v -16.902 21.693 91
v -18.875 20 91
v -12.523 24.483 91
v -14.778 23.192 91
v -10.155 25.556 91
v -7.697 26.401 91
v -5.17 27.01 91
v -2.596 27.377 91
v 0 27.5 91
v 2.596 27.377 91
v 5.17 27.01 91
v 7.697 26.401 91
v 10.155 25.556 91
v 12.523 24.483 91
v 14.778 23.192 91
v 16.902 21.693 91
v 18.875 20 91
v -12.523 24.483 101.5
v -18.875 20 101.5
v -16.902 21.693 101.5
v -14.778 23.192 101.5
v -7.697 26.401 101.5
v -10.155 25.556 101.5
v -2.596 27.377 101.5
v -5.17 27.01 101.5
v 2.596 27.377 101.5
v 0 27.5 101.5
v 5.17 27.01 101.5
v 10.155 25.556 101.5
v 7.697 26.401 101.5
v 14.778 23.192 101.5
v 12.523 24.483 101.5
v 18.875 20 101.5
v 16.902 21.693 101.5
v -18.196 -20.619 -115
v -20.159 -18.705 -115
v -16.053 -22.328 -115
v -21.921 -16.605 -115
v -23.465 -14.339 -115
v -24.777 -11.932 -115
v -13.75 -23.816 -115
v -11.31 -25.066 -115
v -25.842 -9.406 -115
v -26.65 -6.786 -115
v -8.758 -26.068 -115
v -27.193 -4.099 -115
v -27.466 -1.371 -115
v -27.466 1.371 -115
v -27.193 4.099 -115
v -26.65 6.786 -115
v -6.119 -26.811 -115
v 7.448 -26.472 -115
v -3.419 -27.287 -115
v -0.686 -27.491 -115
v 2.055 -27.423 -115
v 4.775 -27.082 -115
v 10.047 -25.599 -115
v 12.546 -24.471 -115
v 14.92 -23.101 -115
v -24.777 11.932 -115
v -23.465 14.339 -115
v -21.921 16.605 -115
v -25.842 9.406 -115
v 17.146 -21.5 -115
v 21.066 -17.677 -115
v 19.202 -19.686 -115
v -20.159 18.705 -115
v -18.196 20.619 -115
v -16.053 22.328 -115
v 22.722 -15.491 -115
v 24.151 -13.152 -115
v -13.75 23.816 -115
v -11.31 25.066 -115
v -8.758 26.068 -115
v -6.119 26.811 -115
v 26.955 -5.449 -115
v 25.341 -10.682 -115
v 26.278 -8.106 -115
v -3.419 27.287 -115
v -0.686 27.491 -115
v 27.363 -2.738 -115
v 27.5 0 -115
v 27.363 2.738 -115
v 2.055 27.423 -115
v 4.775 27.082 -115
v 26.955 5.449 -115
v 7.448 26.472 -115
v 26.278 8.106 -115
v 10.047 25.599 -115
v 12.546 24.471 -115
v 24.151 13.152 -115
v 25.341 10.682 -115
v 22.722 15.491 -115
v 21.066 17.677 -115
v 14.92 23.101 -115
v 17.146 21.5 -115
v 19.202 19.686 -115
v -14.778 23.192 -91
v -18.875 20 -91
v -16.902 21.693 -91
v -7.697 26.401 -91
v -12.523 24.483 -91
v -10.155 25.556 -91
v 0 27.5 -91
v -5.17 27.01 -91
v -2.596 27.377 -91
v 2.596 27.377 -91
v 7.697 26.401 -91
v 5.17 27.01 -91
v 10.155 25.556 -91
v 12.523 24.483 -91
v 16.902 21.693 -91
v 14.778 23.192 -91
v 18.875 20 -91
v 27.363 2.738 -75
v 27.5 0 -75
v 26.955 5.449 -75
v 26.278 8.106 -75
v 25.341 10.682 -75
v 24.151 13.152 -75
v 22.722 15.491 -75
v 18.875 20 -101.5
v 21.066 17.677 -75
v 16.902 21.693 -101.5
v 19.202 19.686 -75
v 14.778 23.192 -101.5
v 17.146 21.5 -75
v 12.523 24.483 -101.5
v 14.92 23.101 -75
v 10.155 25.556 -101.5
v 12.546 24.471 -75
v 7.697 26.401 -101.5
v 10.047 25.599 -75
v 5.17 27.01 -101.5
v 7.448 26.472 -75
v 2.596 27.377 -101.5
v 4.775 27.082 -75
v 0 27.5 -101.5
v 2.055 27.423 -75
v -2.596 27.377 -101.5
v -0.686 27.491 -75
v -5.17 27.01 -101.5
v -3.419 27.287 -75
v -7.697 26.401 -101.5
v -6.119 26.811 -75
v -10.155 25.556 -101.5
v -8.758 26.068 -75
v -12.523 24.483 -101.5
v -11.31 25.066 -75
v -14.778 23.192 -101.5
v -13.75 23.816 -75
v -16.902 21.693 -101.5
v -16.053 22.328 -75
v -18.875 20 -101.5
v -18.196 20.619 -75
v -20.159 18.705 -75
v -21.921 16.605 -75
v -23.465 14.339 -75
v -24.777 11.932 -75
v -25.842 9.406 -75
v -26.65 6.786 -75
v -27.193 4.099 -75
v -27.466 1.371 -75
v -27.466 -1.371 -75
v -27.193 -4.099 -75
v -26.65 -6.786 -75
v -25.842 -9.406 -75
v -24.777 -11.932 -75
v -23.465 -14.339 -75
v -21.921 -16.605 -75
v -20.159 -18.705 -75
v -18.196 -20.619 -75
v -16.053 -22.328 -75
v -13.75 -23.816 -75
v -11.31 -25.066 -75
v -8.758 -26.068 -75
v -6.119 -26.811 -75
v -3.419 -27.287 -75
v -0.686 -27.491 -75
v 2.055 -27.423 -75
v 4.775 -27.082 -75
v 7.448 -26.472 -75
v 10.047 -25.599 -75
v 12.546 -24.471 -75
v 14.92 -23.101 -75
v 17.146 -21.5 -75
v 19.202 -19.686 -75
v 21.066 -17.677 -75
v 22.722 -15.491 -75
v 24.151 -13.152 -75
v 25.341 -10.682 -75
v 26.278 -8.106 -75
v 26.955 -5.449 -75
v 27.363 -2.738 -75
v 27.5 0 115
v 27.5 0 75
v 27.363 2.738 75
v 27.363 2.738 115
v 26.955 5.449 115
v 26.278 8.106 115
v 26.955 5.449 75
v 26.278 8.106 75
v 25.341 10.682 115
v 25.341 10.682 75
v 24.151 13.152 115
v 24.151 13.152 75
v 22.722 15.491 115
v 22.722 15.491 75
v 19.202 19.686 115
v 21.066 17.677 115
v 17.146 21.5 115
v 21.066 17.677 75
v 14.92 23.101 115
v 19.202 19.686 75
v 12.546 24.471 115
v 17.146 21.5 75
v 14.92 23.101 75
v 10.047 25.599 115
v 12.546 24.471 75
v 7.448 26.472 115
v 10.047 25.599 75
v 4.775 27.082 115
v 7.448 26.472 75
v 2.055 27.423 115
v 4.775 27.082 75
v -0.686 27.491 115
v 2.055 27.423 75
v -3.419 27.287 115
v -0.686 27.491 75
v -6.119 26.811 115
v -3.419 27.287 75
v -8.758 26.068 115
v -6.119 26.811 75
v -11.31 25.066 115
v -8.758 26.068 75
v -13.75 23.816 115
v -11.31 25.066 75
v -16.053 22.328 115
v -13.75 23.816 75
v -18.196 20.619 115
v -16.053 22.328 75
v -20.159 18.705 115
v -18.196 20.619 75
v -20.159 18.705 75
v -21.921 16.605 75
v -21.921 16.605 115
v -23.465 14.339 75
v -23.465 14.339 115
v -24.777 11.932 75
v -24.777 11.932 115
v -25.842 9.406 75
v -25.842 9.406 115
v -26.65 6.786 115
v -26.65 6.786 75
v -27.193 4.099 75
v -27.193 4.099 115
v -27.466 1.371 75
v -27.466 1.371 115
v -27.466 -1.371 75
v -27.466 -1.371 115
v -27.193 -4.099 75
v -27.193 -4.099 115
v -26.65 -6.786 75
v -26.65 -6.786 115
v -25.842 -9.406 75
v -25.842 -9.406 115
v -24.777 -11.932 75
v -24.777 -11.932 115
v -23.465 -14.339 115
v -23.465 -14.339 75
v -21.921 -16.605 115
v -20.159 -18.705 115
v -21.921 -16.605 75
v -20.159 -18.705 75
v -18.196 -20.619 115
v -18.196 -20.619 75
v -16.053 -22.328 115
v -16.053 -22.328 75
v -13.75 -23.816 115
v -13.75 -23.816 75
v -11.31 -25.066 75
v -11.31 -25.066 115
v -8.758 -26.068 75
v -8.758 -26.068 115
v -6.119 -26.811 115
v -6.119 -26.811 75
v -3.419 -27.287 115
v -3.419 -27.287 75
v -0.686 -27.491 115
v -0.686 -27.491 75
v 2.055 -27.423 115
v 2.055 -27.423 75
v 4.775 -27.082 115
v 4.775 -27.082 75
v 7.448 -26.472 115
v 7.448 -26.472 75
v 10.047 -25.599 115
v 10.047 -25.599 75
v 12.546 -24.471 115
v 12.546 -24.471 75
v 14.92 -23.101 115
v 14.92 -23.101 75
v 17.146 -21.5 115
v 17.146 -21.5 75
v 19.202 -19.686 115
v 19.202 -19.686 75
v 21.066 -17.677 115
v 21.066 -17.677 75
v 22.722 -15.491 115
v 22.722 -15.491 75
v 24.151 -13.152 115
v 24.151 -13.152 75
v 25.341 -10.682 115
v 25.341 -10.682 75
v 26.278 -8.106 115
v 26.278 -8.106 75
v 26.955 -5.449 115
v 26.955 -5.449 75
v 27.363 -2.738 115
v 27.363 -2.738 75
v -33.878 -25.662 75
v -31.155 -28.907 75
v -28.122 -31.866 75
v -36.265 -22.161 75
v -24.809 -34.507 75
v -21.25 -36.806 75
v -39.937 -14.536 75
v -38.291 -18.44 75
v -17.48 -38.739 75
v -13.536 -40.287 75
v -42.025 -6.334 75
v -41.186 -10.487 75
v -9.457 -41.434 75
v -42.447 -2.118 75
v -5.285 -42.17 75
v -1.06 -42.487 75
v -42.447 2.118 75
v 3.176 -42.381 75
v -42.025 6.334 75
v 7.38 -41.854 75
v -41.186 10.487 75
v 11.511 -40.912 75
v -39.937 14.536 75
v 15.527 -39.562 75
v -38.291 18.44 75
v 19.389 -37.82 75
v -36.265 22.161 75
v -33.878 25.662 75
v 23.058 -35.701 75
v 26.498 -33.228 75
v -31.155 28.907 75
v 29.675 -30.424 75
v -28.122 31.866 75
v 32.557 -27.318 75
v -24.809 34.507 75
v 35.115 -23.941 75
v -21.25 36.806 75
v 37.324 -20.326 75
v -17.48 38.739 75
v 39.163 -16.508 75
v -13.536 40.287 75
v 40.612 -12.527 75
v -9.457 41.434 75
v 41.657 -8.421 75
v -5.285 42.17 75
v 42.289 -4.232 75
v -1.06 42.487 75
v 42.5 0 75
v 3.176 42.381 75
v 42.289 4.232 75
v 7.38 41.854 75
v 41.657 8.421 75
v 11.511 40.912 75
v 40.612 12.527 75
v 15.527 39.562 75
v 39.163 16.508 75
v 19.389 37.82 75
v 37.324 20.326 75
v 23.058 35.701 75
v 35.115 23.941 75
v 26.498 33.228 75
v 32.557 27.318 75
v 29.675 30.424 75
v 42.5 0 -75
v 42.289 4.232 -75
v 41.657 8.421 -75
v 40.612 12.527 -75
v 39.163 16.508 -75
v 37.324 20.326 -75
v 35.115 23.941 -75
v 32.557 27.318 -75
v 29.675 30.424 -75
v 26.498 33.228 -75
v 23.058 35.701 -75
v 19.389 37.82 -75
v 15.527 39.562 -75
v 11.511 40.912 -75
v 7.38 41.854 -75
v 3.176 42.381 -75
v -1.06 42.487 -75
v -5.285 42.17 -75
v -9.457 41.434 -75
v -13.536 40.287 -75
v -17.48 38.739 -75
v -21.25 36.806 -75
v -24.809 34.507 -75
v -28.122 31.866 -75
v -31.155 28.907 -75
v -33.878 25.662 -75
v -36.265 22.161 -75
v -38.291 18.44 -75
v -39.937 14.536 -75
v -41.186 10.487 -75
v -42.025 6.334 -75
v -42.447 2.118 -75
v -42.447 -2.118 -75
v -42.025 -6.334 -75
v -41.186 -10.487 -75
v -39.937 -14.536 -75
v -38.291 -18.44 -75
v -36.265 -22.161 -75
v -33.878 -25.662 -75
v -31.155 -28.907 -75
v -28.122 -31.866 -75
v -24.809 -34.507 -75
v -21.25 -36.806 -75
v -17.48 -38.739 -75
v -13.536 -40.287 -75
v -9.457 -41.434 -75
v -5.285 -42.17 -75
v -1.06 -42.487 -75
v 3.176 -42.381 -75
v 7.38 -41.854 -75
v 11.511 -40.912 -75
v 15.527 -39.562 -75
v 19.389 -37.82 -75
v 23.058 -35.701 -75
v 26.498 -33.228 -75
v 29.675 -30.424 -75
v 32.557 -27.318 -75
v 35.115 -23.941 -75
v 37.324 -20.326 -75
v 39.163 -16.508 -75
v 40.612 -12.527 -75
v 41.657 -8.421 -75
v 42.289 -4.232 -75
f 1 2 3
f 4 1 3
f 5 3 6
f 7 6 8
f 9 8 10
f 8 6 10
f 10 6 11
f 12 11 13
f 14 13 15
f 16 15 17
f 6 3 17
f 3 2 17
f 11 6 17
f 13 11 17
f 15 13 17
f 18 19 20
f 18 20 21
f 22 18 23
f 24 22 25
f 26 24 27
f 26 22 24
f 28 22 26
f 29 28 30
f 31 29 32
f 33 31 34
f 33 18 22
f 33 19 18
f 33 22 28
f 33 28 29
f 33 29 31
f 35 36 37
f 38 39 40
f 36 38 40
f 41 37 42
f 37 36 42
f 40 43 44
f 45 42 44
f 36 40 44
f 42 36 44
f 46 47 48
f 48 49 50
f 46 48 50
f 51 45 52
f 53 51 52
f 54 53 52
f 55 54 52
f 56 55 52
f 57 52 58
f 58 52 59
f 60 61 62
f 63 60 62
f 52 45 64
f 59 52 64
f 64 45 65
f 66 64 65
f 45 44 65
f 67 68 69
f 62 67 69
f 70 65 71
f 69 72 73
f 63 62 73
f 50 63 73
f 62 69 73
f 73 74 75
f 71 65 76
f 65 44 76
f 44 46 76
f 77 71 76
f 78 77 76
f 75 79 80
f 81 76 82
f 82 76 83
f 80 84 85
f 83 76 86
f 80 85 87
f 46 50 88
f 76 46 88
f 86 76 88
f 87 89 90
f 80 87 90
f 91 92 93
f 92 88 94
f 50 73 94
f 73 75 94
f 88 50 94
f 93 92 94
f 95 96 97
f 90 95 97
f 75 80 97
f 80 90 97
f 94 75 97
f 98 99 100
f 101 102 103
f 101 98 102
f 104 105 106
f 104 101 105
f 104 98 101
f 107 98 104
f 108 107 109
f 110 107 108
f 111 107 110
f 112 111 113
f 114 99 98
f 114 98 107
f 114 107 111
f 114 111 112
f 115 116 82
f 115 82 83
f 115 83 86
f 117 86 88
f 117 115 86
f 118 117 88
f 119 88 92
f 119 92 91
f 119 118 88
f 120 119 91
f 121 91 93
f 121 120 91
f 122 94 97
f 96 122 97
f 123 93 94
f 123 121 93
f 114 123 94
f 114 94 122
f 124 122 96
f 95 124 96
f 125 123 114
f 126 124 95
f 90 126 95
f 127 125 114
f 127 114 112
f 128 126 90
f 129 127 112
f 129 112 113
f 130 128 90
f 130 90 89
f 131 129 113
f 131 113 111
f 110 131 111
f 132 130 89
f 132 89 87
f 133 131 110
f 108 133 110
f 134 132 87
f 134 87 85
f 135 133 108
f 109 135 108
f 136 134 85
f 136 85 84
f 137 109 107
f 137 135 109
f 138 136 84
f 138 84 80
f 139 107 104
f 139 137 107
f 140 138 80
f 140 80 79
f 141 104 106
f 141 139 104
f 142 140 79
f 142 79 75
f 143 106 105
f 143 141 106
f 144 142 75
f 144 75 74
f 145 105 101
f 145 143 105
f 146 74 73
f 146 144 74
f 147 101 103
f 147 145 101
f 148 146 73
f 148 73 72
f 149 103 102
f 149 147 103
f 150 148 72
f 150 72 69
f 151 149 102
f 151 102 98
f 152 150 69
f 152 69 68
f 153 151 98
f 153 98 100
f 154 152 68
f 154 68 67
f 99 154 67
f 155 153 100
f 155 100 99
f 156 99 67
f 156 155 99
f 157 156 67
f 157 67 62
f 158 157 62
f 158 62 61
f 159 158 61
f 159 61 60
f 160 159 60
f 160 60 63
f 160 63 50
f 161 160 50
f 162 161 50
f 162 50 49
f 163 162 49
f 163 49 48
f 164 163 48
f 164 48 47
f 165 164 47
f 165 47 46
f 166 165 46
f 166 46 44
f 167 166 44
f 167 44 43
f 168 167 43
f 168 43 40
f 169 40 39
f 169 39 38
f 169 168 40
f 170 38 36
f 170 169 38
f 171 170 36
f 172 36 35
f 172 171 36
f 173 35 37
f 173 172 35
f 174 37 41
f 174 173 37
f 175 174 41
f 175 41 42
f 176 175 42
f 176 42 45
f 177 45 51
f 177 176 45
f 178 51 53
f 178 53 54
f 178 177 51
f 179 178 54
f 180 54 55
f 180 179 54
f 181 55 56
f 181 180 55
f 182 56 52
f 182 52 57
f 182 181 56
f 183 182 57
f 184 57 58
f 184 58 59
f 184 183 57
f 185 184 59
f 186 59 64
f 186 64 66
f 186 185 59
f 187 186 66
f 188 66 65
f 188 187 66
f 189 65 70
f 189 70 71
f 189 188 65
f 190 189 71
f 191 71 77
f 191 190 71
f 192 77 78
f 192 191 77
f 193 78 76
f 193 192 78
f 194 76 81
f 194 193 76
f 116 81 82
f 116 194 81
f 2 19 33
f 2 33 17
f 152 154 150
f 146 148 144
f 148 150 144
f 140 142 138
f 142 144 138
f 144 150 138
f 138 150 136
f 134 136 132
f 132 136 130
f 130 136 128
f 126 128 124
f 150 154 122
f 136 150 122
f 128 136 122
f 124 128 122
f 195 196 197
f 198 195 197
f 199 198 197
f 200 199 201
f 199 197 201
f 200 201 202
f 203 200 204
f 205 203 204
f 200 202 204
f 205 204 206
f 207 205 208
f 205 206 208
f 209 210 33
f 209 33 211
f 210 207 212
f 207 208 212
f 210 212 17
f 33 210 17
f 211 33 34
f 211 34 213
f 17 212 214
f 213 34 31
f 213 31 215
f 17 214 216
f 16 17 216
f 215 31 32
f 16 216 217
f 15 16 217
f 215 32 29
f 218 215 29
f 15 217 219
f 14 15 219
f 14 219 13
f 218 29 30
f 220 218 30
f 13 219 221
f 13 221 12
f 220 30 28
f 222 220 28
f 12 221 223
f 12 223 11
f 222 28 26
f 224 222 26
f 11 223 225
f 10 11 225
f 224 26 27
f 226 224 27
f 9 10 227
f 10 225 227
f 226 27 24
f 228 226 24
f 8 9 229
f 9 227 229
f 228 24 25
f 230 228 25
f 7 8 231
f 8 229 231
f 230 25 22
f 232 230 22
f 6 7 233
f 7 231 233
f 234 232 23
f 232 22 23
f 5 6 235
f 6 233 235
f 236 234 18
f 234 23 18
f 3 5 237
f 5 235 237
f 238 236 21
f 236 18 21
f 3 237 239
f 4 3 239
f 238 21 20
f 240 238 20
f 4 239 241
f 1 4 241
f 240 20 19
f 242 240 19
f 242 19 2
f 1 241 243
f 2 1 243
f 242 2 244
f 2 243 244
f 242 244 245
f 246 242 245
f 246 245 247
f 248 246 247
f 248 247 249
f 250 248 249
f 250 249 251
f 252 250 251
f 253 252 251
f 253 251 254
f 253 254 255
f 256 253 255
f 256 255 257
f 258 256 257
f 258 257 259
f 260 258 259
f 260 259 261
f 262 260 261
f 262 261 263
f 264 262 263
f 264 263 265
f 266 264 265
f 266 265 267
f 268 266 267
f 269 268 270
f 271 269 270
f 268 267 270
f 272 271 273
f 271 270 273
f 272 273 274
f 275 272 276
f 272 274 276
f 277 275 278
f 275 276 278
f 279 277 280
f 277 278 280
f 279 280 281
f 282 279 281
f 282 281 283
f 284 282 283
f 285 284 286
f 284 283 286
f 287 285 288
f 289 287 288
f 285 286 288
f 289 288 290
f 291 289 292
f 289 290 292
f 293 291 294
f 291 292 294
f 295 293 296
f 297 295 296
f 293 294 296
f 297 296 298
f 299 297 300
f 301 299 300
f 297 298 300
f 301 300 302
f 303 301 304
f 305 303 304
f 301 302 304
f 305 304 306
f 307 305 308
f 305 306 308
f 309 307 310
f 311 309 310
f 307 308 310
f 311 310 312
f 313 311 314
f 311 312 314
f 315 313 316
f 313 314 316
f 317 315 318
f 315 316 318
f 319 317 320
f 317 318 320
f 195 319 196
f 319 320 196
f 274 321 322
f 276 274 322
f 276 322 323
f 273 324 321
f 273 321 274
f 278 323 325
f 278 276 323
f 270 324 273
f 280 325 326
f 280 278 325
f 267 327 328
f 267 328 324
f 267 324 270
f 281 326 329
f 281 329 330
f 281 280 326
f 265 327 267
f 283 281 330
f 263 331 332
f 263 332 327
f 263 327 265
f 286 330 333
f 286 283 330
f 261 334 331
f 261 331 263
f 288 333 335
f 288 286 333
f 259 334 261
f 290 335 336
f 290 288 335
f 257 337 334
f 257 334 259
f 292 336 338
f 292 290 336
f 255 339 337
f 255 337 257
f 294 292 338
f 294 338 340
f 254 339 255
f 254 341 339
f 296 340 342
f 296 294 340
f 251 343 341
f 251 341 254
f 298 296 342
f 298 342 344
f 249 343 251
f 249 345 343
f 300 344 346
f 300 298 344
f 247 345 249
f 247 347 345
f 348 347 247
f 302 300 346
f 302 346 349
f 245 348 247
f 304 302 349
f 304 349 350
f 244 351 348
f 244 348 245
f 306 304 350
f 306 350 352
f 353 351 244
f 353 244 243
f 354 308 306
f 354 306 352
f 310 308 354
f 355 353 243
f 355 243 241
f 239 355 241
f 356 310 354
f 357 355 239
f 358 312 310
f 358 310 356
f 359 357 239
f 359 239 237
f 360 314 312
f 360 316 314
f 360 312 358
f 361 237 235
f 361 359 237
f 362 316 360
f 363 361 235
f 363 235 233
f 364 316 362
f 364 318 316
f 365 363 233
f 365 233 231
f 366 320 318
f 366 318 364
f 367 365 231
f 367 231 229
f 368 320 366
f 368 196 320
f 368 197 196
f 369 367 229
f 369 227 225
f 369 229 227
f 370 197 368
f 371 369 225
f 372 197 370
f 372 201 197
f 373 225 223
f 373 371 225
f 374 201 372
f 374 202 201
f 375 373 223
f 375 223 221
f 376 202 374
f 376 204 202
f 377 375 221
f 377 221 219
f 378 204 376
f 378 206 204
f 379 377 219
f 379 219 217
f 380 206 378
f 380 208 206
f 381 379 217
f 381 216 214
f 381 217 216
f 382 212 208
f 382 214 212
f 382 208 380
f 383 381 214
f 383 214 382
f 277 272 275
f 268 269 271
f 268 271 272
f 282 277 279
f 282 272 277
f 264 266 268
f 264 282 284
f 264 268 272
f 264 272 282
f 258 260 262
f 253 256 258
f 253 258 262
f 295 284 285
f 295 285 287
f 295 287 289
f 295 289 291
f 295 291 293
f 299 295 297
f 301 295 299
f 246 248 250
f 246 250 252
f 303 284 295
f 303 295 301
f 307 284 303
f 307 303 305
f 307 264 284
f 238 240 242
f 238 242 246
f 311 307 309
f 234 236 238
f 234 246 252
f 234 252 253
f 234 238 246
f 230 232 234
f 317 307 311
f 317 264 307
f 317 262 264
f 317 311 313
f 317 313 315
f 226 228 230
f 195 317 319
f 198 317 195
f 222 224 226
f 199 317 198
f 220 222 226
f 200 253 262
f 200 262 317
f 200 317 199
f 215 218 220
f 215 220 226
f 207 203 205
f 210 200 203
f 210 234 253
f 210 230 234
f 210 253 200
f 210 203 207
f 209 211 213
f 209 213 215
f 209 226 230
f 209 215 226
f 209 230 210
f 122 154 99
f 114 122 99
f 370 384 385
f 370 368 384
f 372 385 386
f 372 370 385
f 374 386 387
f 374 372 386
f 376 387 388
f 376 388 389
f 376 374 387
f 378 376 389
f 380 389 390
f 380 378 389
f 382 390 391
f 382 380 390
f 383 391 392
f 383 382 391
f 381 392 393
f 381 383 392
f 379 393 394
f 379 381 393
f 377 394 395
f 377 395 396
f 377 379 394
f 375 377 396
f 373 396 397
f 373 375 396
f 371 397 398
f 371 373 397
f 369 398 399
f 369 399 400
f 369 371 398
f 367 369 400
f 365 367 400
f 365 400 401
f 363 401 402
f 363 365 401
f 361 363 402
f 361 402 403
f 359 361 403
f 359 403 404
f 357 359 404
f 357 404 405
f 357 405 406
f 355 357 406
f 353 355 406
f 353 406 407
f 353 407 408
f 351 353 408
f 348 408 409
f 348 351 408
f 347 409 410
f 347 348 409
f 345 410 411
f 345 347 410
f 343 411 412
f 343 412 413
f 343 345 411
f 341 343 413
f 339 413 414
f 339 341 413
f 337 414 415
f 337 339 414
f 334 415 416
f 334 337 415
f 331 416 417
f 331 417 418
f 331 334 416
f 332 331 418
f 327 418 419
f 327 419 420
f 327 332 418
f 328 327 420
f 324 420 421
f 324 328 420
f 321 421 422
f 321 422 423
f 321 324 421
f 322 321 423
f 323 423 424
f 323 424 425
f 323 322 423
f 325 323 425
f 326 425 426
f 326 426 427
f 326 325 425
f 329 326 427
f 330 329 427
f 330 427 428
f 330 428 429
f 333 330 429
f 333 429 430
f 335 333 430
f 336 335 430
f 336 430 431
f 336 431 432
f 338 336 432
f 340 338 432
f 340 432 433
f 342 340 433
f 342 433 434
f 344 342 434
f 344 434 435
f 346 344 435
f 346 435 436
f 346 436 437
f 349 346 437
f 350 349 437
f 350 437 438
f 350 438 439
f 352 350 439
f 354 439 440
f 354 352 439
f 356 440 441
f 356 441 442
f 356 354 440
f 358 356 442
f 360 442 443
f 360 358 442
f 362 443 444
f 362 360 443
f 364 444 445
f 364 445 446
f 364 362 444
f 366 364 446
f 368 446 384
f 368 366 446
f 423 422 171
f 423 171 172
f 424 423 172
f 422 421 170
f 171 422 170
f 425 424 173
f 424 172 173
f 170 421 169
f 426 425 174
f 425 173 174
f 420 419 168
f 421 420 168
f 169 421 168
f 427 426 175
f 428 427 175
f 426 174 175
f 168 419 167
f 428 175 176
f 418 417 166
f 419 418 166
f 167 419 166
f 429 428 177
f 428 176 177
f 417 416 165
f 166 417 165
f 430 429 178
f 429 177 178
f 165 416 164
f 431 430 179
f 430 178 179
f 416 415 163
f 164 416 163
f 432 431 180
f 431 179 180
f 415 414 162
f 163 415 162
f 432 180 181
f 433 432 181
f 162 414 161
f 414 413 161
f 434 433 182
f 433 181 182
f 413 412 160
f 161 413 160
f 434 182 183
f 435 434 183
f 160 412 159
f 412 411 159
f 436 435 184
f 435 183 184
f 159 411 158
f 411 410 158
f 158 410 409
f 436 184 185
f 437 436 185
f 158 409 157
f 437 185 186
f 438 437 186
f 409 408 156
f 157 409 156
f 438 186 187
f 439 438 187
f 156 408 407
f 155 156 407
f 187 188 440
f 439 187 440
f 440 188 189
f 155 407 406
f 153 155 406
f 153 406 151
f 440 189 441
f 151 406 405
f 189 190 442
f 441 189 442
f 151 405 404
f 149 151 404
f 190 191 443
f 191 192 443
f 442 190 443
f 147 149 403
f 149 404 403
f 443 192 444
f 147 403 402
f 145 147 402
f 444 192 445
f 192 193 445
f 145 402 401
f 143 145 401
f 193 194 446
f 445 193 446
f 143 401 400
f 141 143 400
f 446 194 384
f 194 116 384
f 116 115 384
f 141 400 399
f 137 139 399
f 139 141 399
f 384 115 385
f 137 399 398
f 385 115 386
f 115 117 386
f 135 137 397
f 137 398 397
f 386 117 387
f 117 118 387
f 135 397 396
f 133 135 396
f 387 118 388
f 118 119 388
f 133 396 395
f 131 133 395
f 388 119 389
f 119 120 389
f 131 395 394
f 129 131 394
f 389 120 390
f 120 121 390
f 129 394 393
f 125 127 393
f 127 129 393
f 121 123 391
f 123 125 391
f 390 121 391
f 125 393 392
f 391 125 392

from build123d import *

# Parameters (mm, degrees)
SKETCH2_R           = 42.5
BOSS_EXTRUDE2_DEPTH = 75
SKETCH3_R           = 27.5
BOSS_EXTRUDE3_DEPTH = 40
SKETCH4_W           = 10.5
SKETCH4_H           = 8.79879656
CUT_EXTRUDE1_DEPTH  = 50


with BuildPart() as part:
    # Sketch2 → Boss-Extrude2 (new, symmetric)
    with BuildSketch(Plane.XY):
        Circle(SKETCH2_R)
    extrude(amount=BOSS_EXTRUDE2_DEPTH, both=True)

    # Sketch3 → Boss-Extrude3 (add)
    with BuildSketch(Plane.XY.offset(75)):
        Circle(SKETCH3_R)
    boss_extrude3 = extrude(amount=BOSS_EXTRUDE3_DEPTH)

    # Sketch4 → Cut-Extrude1 (cut, symmetric)
    with BuildSketch(Plane(origin=(0, 0, 0), x_dir=(0, 0, -1), z_dir=(1, 0, 0))):
        with Locations((-96.25, 24.39939828)):
            Rectangle(SKETCH4_W, SKETCH4_H)
    cut_extrude1 = extrude(amount=CUT_EXTRUDE1_DEPTH, both=True, mode=Mode.SUBTRACT)

    # Mirror3: Boss-Extrude3, Cut-Extrude1 across plane
    add(boss_extrude3.mirror(Plane.XY))
    add(cut_extrude1.mirror(Plane.XY), mode=Mode.SUBTRACT)


solid = part.part
